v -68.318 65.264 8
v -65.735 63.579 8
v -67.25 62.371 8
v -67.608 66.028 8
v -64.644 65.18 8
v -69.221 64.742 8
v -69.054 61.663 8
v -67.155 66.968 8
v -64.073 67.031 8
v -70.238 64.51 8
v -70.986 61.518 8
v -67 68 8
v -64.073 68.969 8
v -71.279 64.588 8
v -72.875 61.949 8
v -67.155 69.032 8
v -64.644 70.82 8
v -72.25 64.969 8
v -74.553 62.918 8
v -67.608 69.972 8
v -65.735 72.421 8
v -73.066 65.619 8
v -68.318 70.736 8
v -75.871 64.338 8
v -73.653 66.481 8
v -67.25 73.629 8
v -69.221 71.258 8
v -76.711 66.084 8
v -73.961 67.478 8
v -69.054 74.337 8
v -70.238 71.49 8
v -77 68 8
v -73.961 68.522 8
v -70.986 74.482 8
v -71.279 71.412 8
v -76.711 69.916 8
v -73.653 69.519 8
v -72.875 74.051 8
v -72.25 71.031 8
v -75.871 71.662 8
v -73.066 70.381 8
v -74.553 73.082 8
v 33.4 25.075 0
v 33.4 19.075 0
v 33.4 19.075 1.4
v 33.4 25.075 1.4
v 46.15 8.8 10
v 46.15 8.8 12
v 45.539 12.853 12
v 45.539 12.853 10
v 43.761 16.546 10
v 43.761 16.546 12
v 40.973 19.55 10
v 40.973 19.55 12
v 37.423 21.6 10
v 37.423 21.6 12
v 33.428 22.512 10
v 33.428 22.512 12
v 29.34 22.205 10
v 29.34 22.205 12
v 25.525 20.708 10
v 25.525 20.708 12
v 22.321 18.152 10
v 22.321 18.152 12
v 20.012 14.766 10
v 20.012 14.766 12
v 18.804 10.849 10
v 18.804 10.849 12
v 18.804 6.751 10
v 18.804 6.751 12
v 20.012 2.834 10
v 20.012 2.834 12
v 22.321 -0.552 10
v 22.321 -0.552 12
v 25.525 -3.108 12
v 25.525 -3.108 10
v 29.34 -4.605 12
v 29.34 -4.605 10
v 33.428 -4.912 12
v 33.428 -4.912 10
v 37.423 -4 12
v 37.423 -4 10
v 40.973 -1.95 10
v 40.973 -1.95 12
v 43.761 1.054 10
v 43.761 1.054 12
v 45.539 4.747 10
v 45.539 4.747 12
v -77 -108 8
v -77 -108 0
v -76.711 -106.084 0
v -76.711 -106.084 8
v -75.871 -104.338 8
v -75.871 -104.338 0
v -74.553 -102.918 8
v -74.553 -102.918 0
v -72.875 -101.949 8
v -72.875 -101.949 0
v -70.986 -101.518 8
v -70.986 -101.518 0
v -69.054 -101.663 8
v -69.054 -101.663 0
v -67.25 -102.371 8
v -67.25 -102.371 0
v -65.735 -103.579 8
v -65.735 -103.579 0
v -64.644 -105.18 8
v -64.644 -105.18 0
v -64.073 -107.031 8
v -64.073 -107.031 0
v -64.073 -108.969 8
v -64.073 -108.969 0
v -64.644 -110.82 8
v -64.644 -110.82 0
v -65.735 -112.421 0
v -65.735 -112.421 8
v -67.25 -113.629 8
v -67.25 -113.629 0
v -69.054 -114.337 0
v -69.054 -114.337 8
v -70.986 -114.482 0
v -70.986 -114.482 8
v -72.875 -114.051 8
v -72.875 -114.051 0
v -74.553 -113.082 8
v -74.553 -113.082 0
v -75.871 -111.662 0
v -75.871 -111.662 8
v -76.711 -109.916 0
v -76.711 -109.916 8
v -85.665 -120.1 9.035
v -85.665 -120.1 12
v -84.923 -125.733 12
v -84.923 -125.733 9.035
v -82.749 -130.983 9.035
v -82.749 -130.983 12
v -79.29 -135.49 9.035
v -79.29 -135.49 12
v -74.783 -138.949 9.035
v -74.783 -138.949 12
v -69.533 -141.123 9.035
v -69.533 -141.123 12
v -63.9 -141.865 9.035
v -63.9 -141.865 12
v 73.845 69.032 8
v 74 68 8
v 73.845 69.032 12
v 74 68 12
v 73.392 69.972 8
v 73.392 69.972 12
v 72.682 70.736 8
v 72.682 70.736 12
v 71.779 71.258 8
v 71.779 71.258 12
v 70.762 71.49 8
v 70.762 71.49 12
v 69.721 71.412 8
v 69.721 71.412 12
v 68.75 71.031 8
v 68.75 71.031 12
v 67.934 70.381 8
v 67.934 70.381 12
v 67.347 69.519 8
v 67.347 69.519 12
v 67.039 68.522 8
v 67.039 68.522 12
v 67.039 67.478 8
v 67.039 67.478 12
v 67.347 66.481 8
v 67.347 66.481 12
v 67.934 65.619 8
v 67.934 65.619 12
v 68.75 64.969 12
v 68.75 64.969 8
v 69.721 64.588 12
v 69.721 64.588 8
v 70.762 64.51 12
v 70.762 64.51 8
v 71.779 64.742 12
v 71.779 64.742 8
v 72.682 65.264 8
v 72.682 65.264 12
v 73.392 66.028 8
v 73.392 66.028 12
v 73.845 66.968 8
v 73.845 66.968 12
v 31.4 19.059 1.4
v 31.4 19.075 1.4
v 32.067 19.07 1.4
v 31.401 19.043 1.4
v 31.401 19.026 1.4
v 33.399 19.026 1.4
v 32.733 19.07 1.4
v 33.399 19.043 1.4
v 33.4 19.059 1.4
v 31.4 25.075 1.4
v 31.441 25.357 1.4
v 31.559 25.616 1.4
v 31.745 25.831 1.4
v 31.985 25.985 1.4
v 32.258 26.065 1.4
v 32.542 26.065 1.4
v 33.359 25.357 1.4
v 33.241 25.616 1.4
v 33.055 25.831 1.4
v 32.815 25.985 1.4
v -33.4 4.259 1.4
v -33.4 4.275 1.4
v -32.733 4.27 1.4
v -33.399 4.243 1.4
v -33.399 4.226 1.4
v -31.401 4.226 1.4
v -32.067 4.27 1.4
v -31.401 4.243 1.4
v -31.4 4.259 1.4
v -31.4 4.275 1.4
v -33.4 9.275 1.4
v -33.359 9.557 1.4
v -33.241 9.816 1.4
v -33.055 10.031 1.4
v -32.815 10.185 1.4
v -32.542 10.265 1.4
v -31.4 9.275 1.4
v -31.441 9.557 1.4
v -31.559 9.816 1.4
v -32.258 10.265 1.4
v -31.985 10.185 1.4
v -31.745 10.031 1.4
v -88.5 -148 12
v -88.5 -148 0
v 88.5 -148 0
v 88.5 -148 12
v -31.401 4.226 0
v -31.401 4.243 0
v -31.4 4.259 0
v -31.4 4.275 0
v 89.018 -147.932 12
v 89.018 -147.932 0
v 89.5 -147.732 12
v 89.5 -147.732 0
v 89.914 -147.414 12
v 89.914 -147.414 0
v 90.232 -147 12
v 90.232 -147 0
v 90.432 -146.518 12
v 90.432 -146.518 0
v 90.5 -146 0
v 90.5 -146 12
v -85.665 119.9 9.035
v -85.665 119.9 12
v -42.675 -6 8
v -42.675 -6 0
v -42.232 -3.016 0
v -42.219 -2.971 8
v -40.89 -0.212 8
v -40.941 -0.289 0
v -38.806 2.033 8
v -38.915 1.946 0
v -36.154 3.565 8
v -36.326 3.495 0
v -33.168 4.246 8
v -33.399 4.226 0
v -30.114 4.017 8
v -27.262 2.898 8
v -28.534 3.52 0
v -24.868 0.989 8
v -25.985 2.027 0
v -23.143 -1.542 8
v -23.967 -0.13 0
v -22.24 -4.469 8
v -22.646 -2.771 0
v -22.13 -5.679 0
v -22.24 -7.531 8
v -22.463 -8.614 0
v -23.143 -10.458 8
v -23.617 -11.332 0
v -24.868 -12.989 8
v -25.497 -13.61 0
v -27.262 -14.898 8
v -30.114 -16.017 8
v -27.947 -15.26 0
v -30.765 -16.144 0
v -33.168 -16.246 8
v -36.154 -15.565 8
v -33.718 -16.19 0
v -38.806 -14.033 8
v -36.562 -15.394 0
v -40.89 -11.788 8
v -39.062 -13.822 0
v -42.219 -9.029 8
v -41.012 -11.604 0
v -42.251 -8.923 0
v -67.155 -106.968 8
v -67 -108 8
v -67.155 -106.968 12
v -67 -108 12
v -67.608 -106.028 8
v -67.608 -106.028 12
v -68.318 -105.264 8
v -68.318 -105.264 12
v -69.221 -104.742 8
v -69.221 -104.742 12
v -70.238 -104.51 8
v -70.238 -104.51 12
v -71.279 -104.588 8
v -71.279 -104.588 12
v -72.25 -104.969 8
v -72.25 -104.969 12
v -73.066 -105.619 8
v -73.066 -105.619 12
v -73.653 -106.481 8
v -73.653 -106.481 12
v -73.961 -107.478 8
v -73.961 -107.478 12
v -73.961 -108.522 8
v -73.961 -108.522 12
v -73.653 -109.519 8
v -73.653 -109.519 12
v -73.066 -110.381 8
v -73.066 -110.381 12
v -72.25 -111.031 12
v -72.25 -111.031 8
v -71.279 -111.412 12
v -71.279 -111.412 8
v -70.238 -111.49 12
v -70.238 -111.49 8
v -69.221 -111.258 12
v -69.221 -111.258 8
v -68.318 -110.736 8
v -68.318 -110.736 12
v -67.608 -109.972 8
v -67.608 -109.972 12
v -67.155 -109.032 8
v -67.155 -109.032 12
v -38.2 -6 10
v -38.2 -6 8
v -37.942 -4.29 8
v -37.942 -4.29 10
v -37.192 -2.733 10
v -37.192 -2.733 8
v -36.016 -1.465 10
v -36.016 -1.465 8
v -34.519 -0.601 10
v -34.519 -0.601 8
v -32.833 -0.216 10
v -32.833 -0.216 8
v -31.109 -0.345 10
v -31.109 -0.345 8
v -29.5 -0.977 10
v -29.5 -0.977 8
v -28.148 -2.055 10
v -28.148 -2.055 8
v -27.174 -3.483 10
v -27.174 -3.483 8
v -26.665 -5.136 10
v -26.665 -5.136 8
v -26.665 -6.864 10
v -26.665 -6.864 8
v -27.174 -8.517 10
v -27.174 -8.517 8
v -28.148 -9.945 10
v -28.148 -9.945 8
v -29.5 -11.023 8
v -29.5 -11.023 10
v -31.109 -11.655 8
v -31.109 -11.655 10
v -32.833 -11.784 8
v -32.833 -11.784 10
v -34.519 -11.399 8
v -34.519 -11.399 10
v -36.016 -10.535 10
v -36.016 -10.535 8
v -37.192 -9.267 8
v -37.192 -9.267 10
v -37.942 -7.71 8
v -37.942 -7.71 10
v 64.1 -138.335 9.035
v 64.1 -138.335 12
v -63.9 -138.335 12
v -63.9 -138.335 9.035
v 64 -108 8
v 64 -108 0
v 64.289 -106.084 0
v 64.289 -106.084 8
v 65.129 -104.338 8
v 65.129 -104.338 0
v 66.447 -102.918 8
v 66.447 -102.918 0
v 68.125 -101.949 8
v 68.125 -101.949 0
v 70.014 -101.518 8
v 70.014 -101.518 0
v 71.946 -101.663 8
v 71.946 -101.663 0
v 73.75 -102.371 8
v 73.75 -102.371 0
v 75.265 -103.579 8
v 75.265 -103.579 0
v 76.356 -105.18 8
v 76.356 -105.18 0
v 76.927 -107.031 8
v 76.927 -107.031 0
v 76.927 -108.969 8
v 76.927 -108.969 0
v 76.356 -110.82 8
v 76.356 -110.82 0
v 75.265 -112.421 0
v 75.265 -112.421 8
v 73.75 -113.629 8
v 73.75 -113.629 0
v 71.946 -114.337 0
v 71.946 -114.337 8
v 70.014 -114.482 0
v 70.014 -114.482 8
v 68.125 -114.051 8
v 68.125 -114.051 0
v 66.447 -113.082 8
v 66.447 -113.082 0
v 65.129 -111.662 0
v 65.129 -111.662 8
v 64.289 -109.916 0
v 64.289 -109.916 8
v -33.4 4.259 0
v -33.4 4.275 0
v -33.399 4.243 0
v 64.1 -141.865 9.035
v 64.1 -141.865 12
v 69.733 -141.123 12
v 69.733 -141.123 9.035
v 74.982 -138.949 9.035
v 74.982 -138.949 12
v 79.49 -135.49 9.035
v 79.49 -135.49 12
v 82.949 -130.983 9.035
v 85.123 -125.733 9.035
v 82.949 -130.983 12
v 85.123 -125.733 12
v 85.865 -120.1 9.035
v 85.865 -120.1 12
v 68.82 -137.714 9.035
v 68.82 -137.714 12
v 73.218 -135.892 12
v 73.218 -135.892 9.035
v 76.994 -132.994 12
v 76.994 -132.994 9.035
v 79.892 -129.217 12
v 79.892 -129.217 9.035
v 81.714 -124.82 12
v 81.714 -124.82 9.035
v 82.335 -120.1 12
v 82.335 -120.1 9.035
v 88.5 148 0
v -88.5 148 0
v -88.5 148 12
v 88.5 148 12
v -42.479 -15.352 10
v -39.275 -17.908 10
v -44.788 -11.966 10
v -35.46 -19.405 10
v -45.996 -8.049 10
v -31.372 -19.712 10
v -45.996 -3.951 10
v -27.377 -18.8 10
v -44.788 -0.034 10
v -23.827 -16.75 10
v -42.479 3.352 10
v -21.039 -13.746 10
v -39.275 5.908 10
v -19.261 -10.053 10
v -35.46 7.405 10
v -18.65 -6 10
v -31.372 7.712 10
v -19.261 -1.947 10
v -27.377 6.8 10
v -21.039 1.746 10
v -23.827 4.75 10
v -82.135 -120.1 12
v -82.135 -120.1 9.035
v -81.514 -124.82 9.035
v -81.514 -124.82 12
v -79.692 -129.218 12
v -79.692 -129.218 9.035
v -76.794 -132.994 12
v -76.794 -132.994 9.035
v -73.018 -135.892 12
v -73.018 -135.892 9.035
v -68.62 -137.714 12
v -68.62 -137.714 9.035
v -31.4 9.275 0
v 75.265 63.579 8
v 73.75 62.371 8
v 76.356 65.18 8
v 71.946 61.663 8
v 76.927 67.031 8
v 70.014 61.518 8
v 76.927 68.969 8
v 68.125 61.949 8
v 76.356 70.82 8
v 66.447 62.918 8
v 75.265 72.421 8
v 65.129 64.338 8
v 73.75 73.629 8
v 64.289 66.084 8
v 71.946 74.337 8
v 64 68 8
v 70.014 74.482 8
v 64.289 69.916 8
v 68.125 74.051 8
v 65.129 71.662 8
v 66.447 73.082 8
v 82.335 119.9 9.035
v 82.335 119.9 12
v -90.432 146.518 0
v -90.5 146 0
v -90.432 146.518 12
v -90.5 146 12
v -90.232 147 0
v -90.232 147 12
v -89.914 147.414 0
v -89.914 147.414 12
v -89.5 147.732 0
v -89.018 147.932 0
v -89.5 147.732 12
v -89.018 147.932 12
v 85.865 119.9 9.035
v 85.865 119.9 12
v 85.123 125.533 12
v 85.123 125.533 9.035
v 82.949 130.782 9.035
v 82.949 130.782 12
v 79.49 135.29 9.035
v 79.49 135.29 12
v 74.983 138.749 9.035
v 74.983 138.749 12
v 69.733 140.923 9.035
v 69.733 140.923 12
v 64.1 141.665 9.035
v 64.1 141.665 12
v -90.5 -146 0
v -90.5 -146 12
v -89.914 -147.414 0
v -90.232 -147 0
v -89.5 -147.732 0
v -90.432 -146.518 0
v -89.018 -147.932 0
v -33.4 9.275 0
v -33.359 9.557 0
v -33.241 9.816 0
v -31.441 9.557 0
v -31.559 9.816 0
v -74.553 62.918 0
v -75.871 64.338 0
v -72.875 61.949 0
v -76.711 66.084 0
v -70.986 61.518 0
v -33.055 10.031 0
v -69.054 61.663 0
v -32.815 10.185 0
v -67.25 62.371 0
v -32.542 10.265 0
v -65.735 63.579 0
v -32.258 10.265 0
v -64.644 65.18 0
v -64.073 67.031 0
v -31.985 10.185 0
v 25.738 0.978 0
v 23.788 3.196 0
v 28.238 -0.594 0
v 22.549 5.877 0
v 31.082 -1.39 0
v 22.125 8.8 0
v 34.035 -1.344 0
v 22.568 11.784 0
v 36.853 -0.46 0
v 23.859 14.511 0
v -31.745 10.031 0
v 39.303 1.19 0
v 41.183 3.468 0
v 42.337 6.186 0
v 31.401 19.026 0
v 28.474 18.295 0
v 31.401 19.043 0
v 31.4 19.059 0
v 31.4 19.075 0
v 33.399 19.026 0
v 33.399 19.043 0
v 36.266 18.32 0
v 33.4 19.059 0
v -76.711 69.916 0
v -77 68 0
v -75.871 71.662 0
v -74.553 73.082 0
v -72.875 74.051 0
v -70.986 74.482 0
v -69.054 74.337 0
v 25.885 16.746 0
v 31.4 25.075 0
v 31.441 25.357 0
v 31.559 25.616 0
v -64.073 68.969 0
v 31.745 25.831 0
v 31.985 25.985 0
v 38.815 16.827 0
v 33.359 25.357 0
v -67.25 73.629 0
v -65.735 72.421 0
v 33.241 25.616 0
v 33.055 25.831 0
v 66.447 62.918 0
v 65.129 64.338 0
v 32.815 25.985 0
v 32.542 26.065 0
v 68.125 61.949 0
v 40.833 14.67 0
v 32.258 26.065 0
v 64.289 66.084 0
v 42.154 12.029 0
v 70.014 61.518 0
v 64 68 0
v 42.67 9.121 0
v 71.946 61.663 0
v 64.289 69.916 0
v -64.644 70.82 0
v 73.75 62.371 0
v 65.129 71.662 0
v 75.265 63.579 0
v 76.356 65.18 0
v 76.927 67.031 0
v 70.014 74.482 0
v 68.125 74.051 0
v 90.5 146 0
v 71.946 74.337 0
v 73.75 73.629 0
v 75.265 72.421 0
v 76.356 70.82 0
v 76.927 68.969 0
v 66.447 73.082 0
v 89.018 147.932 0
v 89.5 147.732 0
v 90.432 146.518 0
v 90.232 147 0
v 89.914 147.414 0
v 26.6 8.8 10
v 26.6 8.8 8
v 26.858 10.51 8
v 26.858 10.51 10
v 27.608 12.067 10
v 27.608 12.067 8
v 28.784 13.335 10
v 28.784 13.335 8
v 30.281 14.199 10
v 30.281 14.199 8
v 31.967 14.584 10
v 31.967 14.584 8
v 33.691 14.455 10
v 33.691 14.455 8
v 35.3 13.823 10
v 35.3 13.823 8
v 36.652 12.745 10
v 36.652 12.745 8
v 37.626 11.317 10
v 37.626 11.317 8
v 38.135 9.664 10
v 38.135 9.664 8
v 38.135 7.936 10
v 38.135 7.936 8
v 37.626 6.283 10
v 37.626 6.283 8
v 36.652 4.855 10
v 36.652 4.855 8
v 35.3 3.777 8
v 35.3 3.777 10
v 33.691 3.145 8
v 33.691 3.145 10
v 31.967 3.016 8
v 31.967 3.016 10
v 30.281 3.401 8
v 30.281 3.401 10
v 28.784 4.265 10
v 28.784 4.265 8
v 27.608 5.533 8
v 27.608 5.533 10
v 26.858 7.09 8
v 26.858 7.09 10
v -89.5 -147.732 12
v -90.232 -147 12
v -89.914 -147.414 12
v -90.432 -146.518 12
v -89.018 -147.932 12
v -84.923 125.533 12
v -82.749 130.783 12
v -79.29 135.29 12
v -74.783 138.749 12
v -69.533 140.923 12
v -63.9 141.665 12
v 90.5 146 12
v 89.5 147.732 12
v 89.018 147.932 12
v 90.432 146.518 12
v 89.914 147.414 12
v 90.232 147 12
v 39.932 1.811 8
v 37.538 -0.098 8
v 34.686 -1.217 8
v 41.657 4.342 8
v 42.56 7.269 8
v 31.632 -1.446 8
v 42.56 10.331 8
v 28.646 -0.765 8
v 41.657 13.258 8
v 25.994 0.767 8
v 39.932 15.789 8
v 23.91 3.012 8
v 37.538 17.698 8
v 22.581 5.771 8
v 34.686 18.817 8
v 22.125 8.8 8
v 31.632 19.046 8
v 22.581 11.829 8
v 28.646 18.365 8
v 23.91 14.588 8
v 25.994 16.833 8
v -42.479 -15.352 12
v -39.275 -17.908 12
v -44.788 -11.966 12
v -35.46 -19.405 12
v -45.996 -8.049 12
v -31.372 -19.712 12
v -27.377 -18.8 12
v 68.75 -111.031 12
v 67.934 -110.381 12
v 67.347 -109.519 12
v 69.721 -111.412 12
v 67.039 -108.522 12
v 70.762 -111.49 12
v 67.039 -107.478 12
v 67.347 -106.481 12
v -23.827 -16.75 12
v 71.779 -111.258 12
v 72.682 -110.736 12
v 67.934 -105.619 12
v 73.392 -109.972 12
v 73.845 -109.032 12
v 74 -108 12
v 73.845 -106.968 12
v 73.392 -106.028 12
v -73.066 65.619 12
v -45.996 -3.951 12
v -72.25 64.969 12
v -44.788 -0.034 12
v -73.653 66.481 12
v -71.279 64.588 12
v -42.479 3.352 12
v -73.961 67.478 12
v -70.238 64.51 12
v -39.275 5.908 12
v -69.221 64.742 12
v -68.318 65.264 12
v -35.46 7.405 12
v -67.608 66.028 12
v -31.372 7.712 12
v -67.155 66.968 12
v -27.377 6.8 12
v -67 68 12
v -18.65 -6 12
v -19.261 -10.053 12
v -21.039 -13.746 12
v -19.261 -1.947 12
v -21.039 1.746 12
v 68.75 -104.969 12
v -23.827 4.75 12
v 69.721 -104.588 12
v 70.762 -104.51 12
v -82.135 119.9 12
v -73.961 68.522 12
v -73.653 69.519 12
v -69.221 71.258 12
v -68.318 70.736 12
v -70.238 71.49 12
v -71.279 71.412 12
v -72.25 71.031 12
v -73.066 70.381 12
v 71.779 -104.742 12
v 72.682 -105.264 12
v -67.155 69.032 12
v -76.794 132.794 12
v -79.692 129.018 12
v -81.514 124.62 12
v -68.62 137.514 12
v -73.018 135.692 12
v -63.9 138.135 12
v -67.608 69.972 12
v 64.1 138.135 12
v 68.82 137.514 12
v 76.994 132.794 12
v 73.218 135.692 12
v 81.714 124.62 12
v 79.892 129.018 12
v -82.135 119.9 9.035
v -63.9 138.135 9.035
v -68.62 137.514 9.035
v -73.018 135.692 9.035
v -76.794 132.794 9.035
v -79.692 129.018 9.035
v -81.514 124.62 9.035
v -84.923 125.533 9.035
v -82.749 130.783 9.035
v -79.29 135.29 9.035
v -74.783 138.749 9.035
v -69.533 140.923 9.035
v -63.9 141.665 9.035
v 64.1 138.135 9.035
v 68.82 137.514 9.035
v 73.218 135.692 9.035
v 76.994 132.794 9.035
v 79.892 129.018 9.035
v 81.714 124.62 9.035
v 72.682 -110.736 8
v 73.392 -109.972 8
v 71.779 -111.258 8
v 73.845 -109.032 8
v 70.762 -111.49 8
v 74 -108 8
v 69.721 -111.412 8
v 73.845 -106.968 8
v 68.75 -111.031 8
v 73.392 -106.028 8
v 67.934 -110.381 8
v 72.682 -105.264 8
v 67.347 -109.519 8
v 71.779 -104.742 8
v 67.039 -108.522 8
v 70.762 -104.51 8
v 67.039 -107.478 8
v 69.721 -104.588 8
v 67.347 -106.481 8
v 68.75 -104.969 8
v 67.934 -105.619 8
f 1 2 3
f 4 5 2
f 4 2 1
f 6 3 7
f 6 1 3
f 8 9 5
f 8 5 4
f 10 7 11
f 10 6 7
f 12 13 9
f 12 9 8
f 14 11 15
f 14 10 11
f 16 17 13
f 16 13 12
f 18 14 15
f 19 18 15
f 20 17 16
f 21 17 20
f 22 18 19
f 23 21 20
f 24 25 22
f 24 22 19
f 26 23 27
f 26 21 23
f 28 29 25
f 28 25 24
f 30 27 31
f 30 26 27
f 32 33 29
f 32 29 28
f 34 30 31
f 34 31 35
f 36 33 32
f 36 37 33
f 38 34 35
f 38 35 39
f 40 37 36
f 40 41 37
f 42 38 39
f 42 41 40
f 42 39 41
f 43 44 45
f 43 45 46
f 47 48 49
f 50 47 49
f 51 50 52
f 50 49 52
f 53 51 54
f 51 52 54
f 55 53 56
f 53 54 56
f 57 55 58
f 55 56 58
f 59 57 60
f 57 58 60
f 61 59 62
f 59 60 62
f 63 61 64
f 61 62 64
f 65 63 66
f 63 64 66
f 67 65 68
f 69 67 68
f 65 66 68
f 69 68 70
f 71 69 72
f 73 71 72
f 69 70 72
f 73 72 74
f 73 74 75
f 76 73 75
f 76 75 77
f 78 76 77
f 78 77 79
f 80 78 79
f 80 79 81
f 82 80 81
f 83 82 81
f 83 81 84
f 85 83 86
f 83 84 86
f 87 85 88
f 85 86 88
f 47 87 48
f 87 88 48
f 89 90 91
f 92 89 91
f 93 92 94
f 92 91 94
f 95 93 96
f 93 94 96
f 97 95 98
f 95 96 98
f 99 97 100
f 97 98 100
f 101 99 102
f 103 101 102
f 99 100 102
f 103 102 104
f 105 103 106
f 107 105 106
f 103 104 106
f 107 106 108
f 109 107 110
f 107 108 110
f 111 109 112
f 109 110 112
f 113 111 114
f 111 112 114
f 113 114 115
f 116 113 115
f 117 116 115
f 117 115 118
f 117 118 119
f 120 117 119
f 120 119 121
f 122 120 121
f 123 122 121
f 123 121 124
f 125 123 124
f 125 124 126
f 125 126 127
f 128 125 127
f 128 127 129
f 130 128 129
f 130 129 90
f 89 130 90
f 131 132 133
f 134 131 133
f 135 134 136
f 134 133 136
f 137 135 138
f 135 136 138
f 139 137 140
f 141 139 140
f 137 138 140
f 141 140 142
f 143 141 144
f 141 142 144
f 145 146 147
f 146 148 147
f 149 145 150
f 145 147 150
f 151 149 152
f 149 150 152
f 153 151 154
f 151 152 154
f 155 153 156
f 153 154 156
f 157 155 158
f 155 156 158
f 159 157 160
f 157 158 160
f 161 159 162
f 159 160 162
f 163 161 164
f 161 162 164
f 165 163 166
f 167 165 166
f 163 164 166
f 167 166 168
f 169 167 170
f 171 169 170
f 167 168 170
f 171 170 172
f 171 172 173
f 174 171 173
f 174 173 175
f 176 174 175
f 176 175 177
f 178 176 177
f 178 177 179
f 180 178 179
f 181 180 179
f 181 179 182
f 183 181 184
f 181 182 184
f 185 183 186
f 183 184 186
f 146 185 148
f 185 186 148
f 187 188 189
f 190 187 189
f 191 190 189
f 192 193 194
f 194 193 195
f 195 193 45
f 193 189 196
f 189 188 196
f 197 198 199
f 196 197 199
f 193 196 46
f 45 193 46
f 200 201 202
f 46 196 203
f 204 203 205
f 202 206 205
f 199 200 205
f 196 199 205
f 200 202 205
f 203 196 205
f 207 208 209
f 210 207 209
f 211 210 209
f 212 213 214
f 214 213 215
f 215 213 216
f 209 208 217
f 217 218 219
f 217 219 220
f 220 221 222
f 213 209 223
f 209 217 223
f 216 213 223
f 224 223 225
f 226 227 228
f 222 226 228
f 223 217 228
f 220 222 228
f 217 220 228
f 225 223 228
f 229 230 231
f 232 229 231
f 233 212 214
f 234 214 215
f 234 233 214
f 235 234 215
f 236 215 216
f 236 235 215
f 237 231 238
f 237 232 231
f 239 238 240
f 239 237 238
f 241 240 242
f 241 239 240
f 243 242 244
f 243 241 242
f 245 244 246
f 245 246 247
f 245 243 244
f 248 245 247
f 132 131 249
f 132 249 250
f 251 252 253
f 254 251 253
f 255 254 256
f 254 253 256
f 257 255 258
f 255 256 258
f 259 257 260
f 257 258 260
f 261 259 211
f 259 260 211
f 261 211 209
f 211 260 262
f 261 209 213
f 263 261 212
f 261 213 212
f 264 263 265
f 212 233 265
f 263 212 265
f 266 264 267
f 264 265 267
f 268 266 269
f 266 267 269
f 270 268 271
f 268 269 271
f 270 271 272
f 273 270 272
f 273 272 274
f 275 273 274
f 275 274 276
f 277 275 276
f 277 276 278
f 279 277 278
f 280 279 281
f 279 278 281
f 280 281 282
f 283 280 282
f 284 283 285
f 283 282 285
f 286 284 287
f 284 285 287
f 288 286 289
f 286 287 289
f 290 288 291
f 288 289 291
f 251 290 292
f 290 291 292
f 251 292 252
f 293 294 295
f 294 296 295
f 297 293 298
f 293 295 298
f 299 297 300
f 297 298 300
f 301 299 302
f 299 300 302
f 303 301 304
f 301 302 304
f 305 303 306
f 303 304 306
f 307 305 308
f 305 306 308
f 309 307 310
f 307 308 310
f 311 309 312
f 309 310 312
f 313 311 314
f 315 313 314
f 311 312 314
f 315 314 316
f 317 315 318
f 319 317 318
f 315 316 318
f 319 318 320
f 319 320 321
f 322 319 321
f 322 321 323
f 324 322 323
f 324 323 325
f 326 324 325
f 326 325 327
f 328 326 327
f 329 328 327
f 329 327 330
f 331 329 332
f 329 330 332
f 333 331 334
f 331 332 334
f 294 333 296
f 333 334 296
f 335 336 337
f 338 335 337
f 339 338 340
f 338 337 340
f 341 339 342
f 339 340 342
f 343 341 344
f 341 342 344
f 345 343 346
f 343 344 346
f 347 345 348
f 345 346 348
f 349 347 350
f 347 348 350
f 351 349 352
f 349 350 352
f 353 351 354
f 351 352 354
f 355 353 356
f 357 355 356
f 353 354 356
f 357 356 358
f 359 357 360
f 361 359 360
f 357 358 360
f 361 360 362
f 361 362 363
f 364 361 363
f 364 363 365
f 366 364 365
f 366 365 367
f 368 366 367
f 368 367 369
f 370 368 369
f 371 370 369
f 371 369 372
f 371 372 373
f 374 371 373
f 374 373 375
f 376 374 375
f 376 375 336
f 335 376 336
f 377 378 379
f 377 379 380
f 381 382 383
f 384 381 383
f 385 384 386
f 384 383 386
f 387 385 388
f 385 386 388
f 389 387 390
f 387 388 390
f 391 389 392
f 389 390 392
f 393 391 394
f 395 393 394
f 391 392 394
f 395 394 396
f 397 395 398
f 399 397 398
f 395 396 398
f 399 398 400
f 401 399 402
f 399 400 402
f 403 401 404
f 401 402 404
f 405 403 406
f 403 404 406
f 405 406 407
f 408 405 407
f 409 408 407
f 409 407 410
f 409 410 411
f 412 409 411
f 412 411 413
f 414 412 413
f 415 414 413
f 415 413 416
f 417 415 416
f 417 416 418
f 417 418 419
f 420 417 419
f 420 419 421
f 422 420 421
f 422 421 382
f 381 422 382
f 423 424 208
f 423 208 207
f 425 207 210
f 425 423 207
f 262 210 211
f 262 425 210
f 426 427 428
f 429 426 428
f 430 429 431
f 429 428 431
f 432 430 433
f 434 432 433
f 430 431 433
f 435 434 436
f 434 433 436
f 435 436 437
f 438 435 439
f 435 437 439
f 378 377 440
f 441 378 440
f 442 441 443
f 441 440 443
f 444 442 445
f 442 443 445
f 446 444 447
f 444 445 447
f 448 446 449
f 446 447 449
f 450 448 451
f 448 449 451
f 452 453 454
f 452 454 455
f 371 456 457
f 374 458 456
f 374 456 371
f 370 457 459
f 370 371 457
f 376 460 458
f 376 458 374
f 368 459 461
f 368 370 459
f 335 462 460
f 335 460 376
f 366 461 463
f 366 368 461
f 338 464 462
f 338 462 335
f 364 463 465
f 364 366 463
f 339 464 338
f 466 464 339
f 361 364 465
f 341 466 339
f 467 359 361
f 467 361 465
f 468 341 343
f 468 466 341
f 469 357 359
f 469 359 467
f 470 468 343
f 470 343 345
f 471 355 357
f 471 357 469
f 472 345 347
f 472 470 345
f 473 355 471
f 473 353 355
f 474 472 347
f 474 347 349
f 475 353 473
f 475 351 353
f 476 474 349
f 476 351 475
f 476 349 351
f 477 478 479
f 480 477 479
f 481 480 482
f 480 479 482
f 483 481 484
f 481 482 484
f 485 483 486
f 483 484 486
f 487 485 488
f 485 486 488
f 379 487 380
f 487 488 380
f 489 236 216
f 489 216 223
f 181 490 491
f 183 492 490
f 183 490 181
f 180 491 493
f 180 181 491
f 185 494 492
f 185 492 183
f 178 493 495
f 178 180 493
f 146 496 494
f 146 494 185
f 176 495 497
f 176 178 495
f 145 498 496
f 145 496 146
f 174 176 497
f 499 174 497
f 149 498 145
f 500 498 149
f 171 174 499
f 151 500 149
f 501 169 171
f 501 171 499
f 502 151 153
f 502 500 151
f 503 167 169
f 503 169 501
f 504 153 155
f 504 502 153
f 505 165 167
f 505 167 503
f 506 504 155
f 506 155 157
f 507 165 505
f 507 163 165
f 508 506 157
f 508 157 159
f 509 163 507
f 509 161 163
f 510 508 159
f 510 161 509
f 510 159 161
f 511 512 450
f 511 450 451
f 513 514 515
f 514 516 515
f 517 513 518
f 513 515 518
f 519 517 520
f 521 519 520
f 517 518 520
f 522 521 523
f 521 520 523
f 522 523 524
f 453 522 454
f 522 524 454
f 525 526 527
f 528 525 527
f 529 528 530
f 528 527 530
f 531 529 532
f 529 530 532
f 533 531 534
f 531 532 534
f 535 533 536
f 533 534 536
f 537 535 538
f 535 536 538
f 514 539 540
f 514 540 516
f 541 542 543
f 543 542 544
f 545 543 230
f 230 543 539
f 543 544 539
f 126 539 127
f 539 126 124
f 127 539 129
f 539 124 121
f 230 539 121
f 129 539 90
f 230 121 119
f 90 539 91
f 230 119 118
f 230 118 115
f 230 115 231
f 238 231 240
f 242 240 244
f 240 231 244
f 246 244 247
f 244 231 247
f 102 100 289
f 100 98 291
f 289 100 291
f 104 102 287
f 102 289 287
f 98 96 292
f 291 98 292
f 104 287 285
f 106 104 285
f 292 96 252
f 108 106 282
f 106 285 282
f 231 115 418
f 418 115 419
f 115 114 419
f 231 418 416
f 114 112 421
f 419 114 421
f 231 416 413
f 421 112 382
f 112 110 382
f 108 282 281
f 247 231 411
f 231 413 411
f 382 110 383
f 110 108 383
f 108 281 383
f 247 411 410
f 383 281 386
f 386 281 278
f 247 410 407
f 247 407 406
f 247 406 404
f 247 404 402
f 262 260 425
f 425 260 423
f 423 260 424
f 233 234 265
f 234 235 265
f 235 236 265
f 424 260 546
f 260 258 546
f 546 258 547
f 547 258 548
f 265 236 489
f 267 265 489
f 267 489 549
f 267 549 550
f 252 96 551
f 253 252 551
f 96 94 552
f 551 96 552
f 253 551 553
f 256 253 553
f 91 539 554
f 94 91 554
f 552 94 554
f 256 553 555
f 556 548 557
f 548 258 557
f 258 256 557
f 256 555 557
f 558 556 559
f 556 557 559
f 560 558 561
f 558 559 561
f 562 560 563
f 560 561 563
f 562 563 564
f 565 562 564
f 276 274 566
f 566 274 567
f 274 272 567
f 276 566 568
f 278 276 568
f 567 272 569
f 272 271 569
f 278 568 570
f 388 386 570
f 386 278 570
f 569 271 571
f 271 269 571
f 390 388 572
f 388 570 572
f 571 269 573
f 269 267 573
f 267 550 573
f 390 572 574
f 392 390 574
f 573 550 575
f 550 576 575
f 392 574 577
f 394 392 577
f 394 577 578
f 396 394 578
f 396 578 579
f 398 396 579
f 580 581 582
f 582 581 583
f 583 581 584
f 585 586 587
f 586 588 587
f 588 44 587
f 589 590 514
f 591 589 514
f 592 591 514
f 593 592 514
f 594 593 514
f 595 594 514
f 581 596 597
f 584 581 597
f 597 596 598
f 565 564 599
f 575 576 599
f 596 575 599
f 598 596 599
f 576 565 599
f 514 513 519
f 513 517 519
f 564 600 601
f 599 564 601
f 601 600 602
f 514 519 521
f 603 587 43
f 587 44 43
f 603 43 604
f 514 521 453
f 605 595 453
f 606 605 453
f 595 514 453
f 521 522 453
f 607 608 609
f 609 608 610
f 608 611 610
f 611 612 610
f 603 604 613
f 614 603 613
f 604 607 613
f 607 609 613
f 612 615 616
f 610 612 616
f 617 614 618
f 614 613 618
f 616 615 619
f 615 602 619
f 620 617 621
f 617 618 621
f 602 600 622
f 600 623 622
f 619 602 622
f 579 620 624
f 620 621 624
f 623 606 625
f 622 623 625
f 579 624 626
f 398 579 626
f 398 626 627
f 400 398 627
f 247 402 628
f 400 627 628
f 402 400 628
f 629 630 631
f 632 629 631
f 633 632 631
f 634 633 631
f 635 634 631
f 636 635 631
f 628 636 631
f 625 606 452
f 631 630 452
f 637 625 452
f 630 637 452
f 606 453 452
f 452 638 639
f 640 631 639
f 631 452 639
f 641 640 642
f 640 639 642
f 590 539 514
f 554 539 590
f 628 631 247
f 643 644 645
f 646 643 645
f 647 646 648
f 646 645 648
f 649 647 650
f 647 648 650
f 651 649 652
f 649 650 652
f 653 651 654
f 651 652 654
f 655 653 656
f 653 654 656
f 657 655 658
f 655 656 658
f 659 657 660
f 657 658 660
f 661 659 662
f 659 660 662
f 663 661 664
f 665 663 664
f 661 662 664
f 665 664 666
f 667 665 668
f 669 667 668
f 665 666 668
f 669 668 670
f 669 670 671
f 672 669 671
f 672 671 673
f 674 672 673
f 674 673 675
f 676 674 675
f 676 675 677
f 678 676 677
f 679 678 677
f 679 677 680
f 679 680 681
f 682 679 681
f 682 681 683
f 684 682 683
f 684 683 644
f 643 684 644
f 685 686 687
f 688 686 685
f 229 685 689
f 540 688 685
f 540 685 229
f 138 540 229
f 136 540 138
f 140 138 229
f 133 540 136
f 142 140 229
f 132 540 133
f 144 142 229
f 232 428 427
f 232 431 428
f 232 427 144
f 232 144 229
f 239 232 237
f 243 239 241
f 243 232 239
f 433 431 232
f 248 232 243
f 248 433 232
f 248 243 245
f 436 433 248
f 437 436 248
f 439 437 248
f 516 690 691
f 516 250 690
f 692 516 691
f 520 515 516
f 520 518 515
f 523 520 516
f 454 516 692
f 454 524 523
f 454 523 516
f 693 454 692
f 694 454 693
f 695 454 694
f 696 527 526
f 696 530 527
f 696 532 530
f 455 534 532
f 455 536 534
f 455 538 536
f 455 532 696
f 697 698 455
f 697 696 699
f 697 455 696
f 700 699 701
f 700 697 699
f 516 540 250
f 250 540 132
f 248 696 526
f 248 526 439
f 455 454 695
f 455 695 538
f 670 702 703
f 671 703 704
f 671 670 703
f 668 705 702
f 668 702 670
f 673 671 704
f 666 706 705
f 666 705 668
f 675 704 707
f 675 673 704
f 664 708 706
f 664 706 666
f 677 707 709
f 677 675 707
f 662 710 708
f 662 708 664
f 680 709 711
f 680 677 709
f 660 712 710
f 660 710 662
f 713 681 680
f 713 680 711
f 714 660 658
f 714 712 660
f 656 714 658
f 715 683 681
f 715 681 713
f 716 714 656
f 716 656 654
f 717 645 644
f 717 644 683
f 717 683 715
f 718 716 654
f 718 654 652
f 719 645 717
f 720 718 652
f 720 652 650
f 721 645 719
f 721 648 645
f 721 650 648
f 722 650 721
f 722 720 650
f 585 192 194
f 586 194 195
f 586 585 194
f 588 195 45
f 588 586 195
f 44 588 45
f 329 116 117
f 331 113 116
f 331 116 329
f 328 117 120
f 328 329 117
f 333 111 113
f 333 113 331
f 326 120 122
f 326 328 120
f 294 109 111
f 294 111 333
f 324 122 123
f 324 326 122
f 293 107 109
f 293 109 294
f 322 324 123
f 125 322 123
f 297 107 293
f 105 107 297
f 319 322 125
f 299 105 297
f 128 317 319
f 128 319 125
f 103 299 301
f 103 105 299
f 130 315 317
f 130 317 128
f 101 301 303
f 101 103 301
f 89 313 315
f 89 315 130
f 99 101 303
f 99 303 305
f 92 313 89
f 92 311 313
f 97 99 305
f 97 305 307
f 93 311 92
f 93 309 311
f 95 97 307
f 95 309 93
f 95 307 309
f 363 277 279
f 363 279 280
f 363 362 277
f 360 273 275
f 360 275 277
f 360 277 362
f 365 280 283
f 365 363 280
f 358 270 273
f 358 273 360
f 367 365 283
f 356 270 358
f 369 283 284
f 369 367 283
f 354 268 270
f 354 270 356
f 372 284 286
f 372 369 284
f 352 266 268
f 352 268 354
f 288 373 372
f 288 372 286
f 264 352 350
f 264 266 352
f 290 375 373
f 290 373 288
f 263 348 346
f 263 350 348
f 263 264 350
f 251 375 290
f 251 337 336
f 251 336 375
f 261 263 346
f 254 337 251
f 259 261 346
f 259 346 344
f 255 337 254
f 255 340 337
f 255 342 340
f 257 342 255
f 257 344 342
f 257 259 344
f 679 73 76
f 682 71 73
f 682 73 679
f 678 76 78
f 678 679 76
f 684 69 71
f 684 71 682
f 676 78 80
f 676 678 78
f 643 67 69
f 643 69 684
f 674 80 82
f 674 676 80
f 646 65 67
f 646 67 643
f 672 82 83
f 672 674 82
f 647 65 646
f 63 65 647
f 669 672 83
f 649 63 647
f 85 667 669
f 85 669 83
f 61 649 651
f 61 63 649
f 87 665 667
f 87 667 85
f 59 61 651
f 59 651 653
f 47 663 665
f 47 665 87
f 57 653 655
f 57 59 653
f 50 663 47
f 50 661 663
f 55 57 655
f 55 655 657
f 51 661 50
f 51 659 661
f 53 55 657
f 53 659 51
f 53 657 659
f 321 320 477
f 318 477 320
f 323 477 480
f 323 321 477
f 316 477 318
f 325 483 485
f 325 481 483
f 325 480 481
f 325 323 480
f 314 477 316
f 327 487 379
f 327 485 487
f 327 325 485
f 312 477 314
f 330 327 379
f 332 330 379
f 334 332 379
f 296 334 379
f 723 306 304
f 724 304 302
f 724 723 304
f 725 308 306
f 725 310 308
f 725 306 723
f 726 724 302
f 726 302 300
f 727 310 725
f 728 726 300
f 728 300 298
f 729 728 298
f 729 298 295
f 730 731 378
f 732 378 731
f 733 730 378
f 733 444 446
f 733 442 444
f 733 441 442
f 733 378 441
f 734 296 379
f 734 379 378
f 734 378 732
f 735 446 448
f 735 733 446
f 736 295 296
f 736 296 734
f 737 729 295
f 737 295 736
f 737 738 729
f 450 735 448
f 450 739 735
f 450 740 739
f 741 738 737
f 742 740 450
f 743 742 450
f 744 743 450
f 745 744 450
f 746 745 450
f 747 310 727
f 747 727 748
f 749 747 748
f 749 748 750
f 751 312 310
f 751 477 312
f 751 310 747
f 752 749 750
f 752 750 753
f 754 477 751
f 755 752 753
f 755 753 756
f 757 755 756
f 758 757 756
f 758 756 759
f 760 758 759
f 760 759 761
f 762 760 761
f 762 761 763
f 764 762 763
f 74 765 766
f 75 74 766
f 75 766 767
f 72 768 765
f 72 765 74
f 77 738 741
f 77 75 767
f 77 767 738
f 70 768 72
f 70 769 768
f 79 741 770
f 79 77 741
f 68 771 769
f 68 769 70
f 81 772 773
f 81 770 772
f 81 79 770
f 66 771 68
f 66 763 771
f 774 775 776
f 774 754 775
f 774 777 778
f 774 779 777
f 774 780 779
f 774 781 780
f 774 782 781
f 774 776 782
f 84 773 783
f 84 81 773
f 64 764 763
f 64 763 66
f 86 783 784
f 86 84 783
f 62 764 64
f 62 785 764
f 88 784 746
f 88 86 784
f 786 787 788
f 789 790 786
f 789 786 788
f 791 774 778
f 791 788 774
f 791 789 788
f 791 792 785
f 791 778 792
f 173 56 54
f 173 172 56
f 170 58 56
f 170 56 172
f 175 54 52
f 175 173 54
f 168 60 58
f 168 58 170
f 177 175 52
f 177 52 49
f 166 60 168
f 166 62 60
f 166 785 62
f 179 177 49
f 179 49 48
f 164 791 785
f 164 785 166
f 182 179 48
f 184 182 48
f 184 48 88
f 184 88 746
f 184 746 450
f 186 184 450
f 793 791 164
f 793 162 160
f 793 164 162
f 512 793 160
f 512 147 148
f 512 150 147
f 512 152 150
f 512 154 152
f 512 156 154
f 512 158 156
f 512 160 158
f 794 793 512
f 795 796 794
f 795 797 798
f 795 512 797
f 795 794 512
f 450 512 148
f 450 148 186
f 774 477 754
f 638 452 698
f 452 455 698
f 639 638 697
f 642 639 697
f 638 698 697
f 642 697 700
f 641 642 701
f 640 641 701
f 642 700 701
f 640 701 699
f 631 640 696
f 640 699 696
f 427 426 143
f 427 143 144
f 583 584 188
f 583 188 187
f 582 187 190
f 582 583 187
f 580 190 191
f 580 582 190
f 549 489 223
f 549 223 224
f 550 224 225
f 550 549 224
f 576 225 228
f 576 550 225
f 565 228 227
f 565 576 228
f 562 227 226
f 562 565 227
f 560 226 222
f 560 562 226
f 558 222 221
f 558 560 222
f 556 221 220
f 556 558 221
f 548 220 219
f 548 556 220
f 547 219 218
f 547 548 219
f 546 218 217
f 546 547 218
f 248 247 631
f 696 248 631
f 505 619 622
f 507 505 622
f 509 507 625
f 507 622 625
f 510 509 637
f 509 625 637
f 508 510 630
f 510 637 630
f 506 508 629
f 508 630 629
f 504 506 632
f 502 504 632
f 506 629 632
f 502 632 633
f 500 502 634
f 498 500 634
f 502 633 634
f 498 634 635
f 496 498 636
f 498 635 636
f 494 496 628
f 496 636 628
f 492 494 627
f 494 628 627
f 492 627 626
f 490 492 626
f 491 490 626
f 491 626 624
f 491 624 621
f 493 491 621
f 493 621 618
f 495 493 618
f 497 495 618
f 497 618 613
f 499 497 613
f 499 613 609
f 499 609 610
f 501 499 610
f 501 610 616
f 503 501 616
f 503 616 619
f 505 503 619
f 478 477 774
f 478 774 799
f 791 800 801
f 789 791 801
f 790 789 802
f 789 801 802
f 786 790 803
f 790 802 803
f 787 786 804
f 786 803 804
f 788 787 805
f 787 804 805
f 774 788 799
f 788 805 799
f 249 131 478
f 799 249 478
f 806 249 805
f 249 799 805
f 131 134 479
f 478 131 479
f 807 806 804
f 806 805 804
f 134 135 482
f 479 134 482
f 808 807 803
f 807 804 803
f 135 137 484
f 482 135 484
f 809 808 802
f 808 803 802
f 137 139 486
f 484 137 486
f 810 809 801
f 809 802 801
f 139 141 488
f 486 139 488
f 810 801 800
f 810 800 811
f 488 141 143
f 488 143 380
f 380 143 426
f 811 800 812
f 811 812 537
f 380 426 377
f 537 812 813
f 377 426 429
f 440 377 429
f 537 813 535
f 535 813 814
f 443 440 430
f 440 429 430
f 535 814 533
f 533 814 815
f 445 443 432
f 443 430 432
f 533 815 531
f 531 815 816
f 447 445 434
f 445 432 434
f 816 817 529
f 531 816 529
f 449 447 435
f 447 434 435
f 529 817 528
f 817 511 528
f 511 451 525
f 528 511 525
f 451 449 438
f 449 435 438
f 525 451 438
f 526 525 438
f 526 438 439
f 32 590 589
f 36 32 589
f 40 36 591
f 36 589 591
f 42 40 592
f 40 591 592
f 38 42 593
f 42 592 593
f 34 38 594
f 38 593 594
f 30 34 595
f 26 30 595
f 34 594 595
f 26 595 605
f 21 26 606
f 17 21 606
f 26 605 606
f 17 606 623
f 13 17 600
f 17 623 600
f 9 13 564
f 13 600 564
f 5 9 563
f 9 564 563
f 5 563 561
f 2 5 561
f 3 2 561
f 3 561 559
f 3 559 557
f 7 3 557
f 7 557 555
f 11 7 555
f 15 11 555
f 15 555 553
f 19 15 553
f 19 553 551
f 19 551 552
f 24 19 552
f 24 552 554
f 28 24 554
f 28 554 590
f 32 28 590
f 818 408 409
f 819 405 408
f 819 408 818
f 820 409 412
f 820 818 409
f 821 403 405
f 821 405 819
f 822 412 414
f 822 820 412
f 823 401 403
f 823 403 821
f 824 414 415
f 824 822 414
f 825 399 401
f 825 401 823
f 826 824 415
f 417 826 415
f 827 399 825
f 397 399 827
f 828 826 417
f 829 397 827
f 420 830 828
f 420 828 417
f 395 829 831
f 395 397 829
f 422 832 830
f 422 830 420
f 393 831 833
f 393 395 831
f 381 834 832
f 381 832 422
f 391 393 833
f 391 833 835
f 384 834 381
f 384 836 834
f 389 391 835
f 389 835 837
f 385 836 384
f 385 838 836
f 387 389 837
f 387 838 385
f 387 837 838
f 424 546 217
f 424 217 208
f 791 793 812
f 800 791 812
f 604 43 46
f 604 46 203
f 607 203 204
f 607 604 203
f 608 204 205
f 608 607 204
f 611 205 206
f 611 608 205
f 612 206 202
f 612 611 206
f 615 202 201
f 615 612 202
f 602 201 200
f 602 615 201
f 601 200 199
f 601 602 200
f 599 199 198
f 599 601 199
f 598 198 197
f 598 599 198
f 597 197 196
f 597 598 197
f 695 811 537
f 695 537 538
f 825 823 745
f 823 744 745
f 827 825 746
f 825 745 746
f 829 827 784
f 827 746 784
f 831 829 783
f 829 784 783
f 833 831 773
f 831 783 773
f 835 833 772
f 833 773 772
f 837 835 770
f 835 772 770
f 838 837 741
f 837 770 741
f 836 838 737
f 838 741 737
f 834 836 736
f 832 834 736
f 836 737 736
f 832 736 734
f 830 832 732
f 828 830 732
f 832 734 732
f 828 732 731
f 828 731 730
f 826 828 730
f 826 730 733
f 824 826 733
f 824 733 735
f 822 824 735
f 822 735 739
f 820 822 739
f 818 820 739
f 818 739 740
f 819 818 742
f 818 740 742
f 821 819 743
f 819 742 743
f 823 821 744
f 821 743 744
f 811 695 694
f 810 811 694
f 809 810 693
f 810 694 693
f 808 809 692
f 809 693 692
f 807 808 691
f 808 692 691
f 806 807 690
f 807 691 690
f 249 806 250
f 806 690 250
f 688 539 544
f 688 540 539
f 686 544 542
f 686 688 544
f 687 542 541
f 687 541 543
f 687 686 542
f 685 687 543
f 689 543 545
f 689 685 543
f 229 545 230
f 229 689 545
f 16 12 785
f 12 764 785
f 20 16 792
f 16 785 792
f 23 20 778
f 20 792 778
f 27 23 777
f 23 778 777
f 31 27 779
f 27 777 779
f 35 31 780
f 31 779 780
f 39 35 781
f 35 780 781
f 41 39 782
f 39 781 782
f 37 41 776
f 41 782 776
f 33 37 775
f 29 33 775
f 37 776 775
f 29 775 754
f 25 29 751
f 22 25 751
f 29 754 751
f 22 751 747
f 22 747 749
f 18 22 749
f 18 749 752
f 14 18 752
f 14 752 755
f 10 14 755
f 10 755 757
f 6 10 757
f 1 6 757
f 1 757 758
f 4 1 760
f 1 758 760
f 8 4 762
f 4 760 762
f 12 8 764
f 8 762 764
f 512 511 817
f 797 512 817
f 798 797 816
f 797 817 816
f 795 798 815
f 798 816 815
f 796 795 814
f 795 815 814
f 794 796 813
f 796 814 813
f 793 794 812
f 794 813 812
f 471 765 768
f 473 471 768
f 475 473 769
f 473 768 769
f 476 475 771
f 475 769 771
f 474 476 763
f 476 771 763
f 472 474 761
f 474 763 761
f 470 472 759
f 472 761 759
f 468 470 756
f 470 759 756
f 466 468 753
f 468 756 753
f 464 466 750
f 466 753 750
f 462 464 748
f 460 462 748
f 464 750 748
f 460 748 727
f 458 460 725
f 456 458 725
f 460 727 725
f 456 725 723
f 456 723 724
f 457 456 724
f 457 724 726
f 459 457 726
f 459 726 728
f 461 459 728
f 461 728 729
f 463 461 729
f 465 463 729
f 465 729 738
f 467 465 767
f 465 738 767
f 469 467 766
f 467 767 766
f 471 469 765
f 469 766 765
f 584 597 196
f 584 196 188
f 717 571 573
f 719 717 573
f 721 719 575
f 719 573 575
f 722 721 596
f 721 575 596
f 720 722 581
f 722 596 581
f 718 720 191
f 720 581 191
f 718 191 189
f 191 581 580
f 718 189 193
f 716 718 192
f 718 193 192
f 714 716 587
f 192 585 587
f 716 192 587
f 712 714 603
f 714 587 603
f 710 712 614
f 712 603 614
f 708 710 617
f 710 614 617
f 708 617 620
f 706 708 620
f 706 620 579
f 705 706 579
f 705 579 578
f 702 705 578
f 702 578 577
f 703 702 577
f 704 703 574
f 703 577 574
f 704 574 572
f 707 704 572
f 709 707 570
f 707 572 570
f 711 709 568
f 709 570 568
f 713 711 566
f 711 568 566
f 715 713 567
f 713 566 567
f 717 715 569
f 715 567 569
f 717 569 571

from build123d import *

# Parameters (mm, degrees)
ESBO_O1_W                                           = 181
ESBO_O1_H                                           = 296
RESSALTO_EXTRUS_O1_DEPTH                            = 12
FILETE1_R                                           = 2
FILETE2_R                                           = 2
ESBO_O4_W                                           = 3.53
ESBO_O4_H                                           = 3.53
REBAIXO_PARA_PARAFUSO_COM_CABE_A_PANELA_D           = 7
REBAIXO_PARA_PARAFUSO_COM_CABE_A_PANELA_CBORE_D     = 13
REBAIXO_PARA_PARAFUSO_COM_CABE_A_PANELA_CBORE_DEPTH = 8
CORTE_EXTRUS_O1_REACH                               = 175.891
ESBO_O9_R                                           = 5.8
ESBO_O10_R                                          = 10.275
CORTE_EXTRUS_O2_DEPTH                               = 8
ESBO_O11_R                                          = 13.75
CORTE_EXTRUS_O3_DEPTH                               = 2
CORTE_EXTRUS_O4_DEPTH                               = 1.4
CORTE_EXTRUS_O5_DEPTH                               = 1.4


with BuildPart() as part:
    # Esboço1 → Ressalto-extrusão1 (new body)
    with BuildSketch(Plane.XY):
        Rectangle(ESBO_O1_W, ESBO_O1_H)
    extrude(amount=RESSALTO_EXTRUS_O1_DEPTH)

    # Filete1
    filete1_edges = [part.edges().sort_by_distance(p)[0] for p in [
        (-90.5, 148, 6),
    ]]
    fillet(filete1_edges, radius=FILETE1_R)

    # Filete2
    filete2_edges = [part.edges().sort_by_distance(p)[0] for p in [
        (90.5, -148, 6),
        (-90.5, -148, 6),
        (90.5, 148, 6),
    ]]
    fillet(filete2_edges, radius=FILETE2_R)

    # Varredura de corte1: sweep along a path in Esboço2
    with BuildLine(Plane.XY.offset(12)) as varredura_de_corte1_path:
        Line((-63.9, -140.1), (64.1, -140.1))
        ThreePointArc((64.1, -140.1), (78.242135624, -134.242135624), (84.1, -120.1))
        Line((84.1, -120.1), (84.1, 119.9))
        ThreePointArc((84.1, 119.9), (78.242135624, 134.042135624), (64.1, 139.9))
        Line((64.1, 139.9), (-63.9, 139.9))
        ThreePointArc((-63.9, 139.9), (-78.042135624, 134.042135624), (-83.9, 119.9))
        Line((-83.9, 119.9), (-83.9, -120.1))
        ThreePointArc((-83.9, -120.1), (-78.042135624, -134.242135624), (-63.9, -140.1))
    # Esboço4 → Varredura de corte1 (sweep, cut)
    with BuildSketch(Plane(origin=(0, 0, 0), x_dir=(1, 0, 0), z_dir=(0, 1, 0))):
        with Locations((-83.9, -10.8)):
            Rectangle(ESBO_O4_W, ESBO_O4_H)
    sweep(path=varredura_de_corte1_path.line, mode=Mode.SUBTRACT)

    # Rebaixo para parafuso com cabeça panela de M61 (through all)
    with Locations(Plane(origin=(0, 0, 0), x_dir=(-1, 0, 0), z_dir=(0, 0, -1))):
        with Locations((-70.5, 68), (70.5, 68), (70.5, -108), (-70.5, -108)):
            CounterBoreHole(REBAIXO_PARA_PARAFUSO_COM_CABE_A_PANELA_D / 2, REBAIXO_PARA_PARAFUSO_COM_CABE_A_PANELA_CBORE_D / 2, REBAIXO_PARA_PARAFUSO_COM_CABE_A_PANELA_CBORE_DEPTH)

    # Esboço9 → Corte-extrusão1 (cut, up to next)
    with BuildSketch(Plane(origin=(0, 0, 0), x_dir=(-1, 0, 0), z_dir=(0, 0, -1)), mode=Mode.PRIVATE) as corte_extrus_o1_sk1:
        with Locations((32.4, -6)):
            Circle(ESBO_O9_R)
    corte_extrus_o1_tool1 = extrude(corte_extrus_o1_sk1.sketch, amount=-CORTE_EXTRUS_O1_REACH, mode=Mode.PRIVATE) & part.part
    # Esboço9 → Corte-extrusão1 (cut, up to next)
    with BuildSketch(Plane(origin=(0, 0, 0), x_dir=(-1, 0, 0), z_dir=(0, 0, -1)), mode=Mode.PRIVATE) as corte_extrus_o1_sk2:
        with Locations((-32.4, 8.8)):
            Circle(ESBO_O9_R)
    corte_extrus_o1_tool2 = extrude(corte_extrus_o1_sk2.sketch, amount=-CORTE_EXTRUS_O1_REACH, mode=Mode.PRIVATE) & part.part
    add(corte_extrus_o1_tool1.solids().sort_by_distance((-32.4, -6, 0))[0], mode=Mode.SUBTRACT)
    add(corte_extrus_o1_tool2.solids().sort_by_distance((32.4, 8.8, 0))[0], mode=Mode.SUBTRACT)

    # Esboço10 → Corte-extrusão2 (cut)
    with BuildSketch(Plane(origin=(0, 0, 0), x_dir=(-1, 0, 0), z_dir=(0, 0, -1))):
        with Locations((32.4, -6)):
            Circle(ESBO_O10_R)
        with Locations((-32.4, 8.8)):
            Circle(ESBO_O10_R)
    extrude(amount=-CORTE_EXTRUS_O2_DEPTH, mode=Mode.SUBTRACT)

    # Esboço11 → Corte-extrusão3 (cut)
    with BuildSketch(Plane.XY.offset(12)):
        with Locations((32.4, 8.8)):
            Circle(ESBO_O11_R)
        with Locations((-32.4, -6)):
            Circle(ESBO_O11_R)
    extrude(amount=-CORTE_EXTRUS_O3_DEPTH, mode=Mode.SUBTRACT)

    # Esboço12 → Corte-extrusão4 (cut)
    with BuildSketch(Plane(origin=(0, 0, 0), x_dir=(-1, 0, 0), z_dir=(0, 0, -1))):
        with BuildLine():
            Line((-33.4, 19.075), (-33.4, 25.075))
            ThreePointArc((-33.4, 25.075), (-32.4, 26.075), (-31.4, 25.075))
            Line((-31.4, 25.075), (-31.4, 19.075))
            ThreePointArc((-31.4, 19.075), (-32.4, 18.075), (-33.4, 19.075))
        make_face()
    extrude(amount=-CORTE_EXTRUS_O4_DEPTH, mode=Mode.SUBTRACT)

    # Esboço13 → Corte-extrusão5 (cut)
    with BuildSketch(Plane(origin=(0, 0, 0), x_dir=(-1, 0, 0), z_dir=(0, 0, -1))):
        with BuildLine():
            Line((31.4, 4.275), (31.4, 9.275))
            ThreePointArc((31.4, 9.275), (32.4, 10.275), (33.4, 9.275))
            Line((33.4, 9.275), (33.4, 4.275))
            ThreePointArc((33.4, 4.275), (32.4, 3.275), (31.4, 4.275))
        make_face()
    extrude(amount=-CORTE_EXTRUS_O5_DEPTH, mode=Mode.SUBTRACT)


solid = part.part
